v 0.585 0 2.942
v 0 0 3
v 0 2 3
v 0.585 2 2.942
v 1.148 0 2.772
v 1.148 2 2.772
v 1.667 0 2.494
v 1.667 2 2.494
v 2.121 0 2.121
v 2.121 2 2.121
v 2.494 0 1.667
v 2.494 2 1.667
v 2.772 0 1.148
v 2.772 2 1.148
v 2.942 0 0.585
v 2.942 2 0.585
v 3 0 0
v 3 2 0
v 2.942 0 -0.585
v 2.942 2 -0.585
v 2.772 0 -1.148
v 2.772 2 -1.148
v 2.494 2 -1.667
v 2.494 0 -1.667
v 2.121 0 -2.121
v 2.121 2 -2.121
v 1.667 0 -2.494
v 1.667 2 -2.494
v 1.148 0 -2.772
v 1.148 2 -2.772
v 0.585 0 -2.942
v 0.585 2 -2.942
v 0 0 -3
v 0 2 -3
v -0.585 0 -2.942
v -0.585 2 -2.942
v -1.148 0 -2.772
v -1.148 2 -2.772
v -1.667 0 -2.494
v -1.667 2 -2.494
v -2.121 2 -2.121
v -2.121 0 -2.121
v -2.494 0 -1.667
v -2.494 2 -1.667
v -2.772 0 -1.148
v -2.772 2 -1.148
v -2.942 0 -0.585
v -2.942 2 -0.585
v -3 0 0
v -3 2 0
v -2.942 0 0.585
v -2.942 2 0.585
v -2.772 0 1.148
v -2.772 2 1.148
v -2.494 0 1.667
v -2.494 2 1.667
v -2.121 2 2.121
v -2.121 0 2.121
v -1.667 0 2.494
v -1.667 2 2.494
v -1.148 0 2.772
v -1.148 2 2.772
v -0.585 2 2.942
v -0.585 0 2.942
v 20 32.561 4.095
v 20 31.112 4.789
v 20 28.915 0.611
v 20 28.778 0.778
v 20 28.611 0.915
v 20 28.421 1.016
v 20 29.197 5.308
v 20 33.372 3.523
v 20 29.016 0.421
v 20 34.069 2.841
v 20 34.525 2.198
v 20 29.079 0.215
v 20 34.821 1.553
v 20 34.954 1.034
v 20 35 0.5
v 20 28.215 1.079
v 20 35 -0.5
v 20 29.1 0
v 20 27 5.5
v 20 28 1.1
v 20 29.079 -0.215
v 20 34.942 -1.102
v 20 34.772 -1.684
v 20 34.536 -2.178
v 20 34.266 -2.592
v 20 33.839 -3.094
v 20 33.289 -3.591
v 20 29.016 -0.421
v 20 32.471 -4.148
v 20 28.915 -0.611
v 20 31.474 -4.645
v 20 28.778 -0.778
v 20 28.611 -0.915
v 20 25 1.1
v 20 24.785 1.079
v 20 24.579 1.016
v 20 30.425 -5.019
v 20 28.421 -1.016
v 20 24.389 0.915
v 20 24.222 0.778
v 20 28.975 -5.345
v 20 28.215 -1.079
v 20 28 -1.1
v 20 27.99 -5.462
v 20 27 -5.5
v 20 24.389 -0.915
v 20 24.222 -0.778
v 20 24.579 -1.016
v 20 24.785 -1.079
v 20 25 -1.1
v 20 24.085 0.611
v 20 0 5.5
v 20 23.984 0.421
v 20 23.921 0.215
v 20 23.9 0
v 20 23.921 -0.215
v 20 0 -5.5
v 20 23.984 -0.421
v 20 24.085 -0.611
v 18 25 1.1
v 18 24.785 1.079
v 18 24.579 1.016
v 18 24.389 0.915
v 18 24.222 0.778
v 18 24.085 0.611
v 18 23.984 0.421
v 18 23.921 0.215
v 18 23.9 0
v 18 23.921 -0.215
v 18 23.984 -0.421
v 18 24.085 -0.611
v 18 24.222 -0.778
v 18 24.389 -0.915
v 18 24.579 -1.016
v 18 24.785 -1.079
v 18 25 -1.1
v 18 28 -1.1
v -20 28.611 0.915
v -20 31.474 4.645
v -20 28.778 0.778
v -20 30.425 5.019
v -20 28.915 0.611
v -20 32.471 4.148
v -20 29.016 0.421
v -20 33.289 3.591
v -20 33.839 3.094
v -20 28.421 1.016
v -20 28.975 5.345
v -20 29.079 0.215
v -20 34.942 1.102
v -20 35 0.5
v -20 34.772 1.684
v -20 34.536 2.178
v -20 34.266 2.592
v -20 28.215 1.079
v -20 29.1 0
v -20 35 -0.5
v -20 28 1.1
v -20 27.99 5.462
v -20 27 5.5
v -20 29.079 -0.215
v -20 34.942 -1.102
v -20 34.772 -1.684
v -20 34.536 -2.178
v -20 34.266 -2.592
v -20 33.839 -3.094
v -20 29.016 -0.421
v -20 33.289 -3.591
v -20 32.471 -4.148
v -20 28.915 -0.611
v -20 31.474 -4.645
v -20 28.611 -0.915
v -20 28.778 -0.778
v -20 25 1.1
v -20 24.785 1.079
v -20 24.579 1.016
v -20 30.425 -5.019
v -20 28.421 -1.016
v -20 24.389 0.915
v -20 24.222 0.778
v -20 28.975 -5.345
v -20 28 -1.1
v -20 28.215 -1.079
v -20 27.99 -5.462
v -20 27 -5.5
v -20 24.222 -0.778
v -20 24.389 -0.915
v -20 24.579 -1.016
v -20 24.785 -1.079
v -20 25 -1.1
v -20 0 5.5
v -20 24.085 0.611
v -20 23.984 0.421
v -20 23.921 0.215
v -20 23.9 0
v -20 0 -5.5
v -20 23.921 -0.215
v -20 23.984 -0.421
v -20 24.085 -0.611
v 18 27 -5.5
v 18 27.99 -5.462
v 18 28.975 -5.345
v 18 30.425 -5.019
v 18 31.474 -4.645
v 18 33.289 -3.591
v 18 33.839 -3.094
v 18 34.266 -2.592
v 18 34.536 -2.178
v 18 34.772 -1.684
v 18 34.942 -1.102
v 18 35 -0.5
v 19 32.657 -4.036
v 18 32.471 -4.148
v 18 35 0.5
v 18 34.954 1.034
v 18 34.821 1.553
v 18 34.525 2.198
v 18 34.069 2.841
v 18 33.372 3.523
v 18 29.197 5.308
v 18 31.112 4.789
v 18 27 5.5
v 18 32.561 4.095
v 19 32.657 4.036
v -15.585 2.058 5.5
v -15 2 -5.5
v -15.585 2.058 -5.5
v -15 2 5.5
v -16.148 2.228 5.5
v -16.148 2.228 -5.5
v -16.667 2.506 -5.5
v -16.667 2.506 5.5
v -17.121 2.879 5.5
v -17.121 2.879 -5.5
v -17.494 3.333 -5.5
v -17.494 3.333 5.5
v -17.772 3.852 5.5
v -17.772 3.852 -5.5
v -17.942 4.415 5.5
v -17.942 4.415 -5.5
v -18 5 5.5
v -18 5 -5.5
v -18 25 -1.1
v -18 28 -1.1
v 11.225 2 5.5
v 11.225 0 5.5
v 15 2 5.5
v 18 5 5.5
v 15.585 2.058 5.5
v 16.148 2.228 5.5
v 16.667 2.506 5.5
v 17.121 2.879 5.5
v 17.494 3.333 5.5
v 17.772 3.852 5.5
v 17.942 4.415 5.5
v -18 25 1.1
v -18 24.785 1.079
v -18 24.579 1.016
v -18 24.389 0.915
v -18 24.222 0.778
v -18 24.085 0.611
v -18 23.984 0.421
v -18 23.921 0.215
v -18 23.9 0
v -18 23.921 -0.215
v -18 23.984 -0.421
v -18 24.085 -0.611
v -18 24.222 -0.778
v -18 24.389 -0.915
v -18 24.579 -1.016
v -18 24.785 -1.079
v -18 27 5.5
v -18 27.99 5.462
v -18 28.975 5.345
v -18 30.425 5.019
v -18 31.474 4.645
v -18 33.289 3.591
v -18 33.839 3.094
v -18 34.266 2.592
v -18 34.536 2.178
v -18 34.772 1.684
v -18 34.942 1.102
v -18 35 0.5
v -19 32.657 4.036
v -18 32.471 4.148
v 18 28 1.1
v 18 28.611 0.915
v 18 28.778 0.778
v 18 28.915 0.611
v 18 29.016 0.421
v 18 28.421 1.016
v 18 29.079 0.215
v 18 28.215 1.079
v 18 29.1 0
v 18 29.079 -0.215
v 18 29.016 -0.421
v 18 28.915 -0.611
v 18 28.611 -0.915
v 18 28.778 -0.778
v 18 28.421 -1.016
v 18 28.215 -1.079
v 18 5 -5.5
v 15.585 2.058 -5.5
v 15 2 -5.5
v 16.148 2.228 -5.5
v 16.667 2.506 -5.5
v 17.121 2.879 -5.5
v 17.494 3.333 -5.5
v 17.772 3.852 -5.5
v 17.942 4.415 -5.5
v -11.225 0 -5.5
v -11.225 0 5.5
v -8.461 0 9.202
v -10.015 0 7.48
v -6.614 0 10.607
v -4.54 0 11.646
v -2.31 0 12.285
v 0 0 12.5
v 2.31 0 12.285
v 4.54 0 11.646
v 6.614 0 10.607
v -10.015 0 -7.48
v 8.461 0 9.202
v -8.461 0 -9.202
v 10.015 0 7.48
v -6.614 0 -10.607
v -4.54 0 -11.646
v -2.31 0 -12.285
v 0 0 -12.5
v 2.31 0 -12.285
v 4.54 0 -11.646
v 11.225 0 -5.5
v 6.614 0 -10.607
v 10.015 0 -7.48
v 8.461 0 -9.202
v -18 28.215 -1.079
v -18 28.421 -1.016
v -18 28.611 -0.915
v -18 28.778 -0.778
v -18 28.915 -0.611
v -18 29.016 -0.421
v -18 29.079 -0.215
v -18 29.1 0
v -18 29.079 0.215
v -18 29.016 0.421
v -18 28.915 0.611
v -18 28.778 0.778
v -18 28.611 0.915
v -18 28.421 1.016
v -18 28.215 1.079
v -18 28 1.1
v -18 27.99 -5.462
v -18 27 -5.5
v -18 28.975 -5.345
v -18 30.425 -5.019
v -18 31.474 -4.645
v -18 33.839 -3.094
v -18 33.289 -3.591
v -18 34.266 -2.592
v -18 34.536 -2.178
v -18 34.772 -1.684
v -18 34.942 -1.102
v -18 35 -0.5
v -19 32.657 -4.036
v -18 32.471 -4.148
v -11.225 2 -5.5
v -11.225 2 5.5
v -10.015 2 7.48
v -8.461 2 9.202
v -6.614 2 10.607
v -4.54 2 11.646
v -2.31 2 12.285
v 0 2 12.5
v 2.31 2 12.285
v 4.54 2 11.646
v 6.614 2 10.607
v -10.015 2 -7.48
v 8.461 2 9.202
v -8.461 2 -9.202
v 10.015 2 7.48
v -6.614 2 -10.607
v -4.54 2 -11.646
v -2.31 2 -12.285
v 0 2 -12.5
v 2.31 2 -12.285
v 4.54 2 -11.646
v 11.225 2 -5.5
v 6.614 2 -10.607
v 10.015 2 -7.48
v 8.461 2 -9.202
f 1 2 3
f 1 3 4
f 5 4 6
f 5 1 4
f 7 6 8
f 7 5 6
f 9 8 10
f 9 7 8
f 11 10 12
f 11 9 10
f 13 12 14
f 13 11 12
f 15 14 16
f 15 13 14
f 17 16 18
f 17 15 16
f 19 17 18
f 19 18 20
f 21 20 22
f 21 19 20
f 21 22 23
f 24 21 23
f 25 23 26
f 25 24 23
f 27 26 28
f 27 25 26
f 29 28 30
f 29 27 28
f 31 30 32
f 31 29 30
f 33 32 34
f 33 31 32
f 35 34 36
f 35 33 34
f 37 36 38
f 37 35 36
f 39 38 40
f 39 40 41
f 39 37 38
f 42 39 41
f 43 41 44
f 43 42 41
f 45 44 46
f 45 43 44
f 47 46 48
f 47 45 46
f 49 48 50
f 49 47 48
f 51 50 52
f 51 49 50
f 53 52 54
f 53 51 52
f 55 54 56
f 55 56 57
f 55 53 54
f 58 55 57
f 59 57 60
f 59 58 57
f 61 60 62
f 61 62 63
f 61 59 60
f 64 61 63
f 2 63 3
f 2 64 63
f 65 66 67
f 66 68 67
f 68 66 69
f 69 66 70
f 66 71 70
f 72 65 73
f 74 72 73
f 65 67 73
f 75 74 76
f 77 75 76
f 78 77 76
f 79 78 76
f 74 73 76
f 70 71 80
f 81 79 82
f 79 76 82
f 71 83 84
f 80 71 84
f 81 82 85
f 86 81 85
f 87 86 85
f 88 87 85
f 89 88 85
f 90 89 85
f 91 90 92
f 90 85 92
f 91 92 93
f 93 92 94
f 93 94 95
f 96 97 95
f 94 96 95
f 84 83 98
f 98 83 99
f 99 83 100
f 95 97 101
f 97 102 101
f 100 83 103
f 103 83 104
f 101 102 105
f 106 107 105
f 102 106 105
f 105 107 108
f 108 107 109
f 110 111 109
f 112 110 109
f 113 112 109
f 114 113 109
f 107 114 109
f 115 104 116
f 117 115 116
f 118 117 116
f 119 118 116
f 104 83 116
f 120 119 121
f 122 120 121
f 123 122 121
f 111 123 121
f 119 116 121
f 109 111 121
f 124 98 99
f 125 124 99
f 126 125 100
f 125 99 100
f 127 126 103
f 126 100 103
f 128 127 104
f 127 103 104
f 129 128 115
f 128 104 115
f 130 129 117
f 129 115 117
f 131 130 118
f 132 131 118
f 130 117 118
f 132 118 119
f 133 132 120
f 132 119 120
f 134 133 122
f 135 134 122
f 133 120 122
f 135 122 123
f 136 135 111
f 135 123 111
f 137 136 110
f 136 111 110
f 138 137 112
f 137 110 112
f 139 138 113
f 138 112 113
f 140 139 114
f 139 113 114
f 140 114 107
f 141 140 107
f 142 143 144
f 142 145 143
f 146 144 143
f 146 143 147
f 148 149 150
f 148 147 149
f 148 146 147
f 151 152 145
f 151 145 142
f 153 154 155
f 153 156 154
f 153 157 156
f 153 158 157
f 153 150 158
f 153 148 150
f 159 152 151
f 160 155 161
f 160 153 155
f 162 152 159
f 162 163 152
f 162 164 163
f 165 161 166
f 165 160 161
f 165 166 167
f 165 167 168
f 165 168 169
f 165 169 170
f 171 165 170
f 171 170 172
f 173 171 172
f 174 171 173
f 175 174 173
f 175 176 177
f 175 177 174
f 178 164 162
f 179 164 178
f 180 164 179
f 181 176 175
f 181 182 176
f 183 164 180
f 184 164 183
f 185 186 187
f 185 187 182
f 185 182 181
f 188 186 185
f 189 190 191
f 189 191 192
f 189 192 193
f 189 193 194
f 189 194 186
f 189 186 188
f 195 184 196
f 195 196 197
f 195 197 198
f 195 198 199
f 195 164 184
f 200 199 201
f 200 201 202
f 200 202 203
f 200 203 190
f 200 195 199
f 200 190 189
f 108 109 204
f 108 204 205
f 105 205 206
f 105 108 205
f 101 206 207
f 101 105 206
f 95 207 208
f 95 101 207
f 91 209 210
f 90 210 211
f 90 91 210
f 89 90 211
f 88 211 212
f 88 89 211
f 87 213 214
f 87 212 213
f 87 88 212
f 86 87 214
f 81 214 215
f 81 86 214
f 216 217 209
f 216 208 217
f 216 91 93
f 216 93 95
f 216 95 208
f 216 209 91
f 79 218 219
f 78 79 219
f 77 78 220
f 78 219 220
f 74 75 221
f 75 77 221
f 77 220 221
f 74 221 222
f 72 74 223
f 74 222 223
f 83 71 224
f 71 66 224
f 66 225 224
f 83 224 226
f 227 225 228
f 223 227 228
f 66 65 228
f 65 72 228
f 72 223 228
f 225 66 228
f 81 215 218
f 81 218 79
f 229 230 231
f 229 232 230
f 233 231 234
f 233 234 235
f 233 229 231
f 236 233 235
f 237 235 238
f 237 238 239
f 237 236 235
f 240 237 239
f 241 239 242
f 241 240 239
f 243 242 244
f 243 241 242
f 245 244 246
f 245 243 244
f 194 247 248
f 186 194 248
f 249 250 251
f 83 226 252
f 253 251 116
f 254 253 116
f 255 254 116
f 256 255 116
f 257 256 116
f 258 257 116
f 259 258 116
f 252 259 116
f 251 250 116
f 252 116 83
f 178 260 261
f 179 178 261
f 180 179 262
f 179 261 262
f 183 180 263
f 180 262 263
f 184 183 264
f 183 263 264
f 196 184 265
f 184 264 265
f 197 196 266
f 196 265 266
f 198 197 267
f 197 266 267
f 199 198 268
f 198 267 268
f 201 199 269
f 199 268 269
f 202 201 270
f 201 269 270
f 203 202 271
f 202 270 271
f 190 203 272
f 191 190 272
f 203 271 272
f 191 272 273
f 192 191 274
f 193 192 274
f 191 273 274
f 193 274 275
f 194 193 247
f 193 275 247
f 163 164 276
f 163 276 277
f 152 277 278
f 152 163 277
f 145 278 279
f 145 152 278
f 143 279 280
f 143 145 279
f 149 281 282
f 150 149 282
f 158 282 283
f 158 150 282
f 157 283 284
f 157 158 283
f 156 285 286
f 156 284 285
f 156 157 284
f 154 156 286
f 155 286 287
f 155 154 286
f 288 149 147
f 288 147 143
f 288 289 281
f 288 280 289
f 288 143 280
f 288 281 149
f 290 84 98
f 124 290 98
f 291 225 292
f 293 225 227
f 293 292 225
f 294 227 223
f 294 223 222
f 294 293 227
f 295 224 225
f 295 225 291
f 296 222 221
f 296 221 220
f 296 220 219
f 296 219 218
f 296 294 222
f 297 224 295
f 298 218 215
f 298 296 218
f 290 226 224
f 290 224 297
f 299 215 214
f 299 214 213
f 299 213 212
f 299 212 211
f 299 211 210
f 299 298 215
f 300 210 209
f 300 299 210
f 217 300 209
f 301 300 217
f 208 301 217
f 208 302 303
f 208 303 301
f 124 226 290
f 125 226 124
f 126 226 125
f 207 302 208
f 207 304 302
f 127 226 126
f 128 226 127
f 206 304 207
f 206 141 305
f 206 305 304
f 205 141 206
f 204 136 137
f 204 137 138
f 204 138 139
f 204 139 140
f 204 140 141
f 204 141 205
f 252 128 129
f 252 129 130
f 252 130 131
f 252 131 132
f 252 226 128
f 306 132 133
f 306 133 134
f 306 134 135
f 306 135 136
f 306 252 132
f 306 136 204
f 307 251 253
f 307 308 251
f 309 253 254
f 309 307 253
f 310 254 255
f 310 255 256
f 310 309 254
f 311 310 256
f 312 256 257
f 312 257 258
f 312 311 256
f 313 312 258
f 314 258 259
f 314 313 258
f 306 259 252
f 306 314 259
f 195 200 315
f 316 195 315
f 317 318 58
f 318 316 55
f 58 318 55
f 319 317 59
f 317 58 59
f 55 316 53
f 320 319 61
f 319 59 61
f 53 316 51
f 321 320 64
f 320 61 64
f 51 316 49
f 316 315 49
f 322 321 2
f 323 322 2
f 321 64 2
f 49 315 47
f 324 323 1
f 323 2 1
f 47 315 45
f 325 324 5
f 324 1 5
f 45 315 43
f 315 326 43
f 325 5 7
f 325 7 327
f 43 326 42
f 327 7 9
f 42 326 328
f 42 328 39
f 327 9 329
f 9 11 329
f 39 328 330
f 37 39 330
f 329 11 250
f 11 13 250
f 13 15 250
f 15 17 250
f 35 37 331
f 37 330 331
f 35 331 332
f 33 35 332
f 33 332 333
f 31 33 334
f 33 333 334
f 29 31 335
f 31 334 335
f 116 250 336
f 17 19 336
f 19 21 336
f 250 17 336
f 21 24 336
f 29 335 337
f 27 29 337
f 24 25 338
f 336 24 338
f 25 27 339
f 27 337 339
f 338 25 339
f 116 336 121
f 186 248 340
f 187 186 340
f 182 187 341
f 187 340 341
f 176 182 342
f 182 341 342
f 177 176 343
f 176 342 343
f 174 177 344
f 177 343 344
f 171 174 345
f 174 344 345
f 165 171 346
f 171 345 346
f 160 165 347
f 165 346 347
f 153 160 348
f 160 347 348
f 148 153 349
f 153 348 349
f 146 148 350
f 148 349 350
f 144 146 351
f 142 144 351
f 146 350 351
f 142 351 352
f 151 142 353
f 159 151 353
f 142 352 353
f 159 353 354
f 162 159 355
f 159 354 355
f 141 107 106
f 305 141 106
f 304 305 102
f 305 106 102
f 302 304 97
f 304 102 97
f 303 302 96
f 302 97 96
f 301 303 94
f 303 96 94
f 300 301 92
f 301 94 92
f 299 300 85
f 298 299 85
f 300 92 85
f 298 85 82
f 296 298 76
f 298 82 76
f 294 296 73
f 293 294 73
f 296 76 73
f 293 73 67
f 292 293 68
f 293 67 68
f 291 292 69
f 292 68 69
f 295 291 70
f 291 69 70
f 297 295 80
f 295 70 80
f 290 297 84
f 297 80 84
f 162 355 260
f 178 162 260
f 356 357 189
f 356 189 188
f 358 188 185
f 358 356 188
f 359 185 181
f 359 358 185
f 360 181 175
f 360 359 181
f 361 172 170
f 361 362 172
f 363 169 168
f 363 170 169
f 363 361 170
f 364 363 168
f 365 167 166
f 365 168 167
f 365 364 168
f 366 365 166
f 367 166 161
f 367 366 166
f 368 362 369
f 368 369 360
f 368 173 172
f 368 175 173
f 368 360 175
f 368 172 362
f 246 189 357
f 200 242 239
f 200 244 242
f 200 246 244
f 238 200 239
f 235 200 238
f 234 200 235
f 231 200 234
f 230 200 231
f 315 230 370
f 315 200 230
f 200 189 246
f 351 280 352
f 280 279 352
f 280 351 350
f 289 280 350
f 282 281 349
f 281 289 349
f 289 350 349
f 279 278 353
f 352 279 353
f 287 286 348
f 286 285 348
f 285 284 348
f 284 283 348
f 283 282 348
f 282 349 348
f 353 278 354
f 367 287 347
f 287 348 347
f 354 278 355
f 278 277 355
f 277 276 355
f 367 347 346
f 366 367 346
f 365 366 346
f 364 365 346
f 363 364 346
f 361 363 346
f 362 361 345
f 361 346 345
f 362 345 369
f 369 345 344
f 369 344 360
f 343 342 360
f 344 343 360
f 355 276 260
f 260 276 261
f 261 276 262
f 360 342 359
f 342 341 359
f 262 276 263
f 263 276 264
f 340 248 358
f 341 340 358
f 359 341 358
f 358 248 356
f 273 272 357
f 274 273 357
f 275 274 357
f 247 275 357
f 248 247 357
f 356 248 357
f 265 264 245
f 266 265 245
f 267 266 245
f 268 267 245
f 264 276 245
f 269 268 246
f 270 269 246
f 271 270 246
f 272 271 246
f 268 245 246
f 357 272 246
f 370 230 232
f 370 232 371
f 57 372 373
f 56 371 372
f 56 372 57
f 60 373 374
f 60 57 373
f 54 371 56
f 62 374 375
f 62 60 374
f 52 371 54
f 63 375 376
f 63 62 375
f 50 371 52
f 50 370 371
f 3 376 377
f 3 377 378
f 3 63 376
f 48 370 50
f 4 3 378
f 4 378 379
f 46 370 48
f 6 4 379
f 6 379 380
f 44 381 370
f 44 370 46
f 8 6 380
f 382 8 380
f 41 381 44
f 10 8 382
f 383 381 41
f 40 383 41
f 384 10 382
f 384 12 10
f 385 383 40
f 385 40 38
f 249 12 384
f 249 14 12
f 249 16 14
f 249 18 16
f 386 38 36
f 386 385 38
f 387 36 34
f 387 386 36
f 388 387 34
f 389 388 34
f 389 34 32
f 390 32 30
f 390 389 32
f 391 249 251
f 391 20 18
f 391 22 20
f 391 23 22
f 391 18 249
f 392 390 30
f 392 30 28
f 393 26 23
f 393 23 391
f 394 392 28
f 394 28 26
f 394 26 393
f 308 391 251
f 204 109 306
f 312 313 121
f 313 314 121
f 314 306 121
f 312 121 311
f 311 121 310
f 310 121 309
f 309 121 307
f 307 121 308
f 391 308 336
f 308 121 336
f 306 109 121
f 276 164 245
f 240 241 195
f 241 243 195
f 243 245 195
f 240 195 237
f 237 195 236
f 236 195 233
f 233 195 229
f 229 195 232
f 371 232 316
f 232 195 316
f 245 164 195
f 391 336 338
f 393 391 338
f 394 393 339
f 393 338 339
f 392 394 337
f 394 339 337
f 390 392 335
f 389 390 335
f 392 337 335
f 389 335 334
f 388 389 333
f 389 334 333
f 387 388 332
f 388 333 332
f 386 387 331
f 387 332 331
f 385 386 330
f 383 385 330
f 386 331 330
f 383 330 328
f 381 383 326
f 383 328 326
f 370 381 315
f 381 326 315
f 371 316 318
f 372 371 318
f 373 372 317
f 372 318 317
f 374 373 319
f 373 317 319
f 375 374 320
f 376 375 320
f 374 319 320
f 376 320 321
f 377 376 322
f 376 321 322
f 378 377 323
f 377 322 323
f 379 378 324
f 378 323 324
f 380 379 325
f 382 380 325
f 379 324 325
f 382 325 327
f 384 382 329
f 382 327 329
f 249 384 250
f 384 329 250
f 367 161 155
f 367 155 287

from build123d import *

# Parameters (mm, degrees)
SKETCH_1_R               = 3
EXTRUDE_1_DEPTH          = 2
SKETCH_2_W               = 2
SKETCH_2_H               = 11
EXTRUDE_2_DEPTH          = 35
FILLET_1_SIZE            = 8
FILLET_1_SIZE_2          = 5
CUT_EXTRUDE_1_DEPTH      = 55.600824307
CUT_EXTRUDE_1_DEPTH_BACK = 55.600824307
FILLET_2_R               = 3


with BuildPart() as part:
    # 草图1 → 凸台-拉伸1 (new body)
    with BuildSketch(Plane(origin=(0, 0, 0), x_dir=(1, 0, 0), z_dir=(0, 1, 0))):
        with BuildLine():
            Line((-11.22497216, 5.5), (-18, 5.5))
            Line((-18, 5.5), (-18, -5.5))
            Line((-18, -5.5), (-11.22497216, -5.5))
            ThreePointArc((-11.22497216, -5.5), (0, -12.5), (11.22497216, -5.5))
            Line((11.22497216, -5.5), (18, -5.5))
            Line((18, -5.5), (18, 5.5))
            Line((18, 5.5), (11.22497216, 5.5))
            ThreePointArc((11.22497216, 5.5), (0, 12.5), (-11.22497216, 5.5))
        make_face()
        with Locations(Location((0, 0, 0), (0, 0, 270))):
            Circle(SKETCH_1_R, mode=Mode.SUBTRACT)
    extrude(amount=EXTRUDE_1_DEPTH)

    # 草图2 → 凸台-拉伸2 (add)
    with BuildSketch(Plane(origin=(0, 0, 0), x_dir=(1, 0, 0), z_dir=(0, 1, 0))):
        with Locations((-19, 0)):
            Rectangle(SKETCH_2_W, SKETCH_2_H)
        with Locations((19, 0)):
            Rectangle(SKETCH_2_W, SKETCH_2_H)
    extrude(amount=EXTRUDE_2_DEPTH)

    # 圆角1
    # an asymmetric fillet: 8, 5 mm, written as the material it takes off along each edge
    with BuildSketch(Plane(origin=(40, 35, -5.5), x_dir=(0, -1, 0), z_dir=(-1, 0, 0)), Plane(origin=(2, 35, -5.5), x_dir=(0, -1, 0), z_dir=(-1, 0, 0)), Plane(origin=(-40, 35, 5.5), x_dir=(0, -1, 0), z_dir=(1, 0, 0))) as fillet_1_piece_1:
        with BuildLine():
            Bezier((FILLET_1_SIZE, 0), (0, 0), (0, FILLET_1_SIZE_2), weights=[1, 0.707106781, 1])
            Line((0, FILLET_1_SIZE_2), (0, 0))
            Line((0, 0), (FILLET_1_SIZE, 0))
        make_face()
    extrude(amount=42, mode=Mode.SUBTRACT)
    with BuildSketch(Plane(origin=(-2, 35, 5.5), x_dir=(0, 0, -1), z_dir=(1, 0, 0))) as fillet_1_piece_2:
        with BuildLine():
            Bezier((FILLET_1_SIZE_2, 0), (0, 0), (0, -FILLET_1_SIZE), weights=[1, 0.707106781, 1])
            Line((0, -FILLET_1_SIZE), (0, 0))
            Line((0, 0), (FILLET_1_SIZE_2, 0))
        make_face()
    extrude(amount=42, mode=Mode.SUBTRACT)

    # 草图3 → 切除-拉伸1 (cut, two sides: drawn at the far end of the back side and taken through both)
    with BuildSketch(Plane.ZY.offset(20).offset(-CUT_EXTRUDE_1_DEPTH_BACK)):
        with BuildLine():
            Line((1.1, 28), (1.1, 25))
            ThreePointArc((1.1, 25), (0, 23.9), (-1.1, 25))
            Line((-1.1, 25), (-1.1, 28))
            ThreePointArc((-1.1, 28), (0, 29.1), (1.1, 28))
        make_face()
    extrude(amount=CUT_EXTRUDE_1_DEPTH + CUT_EXTRUDE_1_DEPTH_BACK, mode=Mode.SUBTRACT)

    # 圆角2
    fillet_2_edges = [part.edges().sort_by_distance(p)[0] for p in [
        (18, 2, 0),
        (-18, 2, 0),
    ]]
    fillet(fillet_2_edges, radius=FILLET_2_R)


solid = part.part
